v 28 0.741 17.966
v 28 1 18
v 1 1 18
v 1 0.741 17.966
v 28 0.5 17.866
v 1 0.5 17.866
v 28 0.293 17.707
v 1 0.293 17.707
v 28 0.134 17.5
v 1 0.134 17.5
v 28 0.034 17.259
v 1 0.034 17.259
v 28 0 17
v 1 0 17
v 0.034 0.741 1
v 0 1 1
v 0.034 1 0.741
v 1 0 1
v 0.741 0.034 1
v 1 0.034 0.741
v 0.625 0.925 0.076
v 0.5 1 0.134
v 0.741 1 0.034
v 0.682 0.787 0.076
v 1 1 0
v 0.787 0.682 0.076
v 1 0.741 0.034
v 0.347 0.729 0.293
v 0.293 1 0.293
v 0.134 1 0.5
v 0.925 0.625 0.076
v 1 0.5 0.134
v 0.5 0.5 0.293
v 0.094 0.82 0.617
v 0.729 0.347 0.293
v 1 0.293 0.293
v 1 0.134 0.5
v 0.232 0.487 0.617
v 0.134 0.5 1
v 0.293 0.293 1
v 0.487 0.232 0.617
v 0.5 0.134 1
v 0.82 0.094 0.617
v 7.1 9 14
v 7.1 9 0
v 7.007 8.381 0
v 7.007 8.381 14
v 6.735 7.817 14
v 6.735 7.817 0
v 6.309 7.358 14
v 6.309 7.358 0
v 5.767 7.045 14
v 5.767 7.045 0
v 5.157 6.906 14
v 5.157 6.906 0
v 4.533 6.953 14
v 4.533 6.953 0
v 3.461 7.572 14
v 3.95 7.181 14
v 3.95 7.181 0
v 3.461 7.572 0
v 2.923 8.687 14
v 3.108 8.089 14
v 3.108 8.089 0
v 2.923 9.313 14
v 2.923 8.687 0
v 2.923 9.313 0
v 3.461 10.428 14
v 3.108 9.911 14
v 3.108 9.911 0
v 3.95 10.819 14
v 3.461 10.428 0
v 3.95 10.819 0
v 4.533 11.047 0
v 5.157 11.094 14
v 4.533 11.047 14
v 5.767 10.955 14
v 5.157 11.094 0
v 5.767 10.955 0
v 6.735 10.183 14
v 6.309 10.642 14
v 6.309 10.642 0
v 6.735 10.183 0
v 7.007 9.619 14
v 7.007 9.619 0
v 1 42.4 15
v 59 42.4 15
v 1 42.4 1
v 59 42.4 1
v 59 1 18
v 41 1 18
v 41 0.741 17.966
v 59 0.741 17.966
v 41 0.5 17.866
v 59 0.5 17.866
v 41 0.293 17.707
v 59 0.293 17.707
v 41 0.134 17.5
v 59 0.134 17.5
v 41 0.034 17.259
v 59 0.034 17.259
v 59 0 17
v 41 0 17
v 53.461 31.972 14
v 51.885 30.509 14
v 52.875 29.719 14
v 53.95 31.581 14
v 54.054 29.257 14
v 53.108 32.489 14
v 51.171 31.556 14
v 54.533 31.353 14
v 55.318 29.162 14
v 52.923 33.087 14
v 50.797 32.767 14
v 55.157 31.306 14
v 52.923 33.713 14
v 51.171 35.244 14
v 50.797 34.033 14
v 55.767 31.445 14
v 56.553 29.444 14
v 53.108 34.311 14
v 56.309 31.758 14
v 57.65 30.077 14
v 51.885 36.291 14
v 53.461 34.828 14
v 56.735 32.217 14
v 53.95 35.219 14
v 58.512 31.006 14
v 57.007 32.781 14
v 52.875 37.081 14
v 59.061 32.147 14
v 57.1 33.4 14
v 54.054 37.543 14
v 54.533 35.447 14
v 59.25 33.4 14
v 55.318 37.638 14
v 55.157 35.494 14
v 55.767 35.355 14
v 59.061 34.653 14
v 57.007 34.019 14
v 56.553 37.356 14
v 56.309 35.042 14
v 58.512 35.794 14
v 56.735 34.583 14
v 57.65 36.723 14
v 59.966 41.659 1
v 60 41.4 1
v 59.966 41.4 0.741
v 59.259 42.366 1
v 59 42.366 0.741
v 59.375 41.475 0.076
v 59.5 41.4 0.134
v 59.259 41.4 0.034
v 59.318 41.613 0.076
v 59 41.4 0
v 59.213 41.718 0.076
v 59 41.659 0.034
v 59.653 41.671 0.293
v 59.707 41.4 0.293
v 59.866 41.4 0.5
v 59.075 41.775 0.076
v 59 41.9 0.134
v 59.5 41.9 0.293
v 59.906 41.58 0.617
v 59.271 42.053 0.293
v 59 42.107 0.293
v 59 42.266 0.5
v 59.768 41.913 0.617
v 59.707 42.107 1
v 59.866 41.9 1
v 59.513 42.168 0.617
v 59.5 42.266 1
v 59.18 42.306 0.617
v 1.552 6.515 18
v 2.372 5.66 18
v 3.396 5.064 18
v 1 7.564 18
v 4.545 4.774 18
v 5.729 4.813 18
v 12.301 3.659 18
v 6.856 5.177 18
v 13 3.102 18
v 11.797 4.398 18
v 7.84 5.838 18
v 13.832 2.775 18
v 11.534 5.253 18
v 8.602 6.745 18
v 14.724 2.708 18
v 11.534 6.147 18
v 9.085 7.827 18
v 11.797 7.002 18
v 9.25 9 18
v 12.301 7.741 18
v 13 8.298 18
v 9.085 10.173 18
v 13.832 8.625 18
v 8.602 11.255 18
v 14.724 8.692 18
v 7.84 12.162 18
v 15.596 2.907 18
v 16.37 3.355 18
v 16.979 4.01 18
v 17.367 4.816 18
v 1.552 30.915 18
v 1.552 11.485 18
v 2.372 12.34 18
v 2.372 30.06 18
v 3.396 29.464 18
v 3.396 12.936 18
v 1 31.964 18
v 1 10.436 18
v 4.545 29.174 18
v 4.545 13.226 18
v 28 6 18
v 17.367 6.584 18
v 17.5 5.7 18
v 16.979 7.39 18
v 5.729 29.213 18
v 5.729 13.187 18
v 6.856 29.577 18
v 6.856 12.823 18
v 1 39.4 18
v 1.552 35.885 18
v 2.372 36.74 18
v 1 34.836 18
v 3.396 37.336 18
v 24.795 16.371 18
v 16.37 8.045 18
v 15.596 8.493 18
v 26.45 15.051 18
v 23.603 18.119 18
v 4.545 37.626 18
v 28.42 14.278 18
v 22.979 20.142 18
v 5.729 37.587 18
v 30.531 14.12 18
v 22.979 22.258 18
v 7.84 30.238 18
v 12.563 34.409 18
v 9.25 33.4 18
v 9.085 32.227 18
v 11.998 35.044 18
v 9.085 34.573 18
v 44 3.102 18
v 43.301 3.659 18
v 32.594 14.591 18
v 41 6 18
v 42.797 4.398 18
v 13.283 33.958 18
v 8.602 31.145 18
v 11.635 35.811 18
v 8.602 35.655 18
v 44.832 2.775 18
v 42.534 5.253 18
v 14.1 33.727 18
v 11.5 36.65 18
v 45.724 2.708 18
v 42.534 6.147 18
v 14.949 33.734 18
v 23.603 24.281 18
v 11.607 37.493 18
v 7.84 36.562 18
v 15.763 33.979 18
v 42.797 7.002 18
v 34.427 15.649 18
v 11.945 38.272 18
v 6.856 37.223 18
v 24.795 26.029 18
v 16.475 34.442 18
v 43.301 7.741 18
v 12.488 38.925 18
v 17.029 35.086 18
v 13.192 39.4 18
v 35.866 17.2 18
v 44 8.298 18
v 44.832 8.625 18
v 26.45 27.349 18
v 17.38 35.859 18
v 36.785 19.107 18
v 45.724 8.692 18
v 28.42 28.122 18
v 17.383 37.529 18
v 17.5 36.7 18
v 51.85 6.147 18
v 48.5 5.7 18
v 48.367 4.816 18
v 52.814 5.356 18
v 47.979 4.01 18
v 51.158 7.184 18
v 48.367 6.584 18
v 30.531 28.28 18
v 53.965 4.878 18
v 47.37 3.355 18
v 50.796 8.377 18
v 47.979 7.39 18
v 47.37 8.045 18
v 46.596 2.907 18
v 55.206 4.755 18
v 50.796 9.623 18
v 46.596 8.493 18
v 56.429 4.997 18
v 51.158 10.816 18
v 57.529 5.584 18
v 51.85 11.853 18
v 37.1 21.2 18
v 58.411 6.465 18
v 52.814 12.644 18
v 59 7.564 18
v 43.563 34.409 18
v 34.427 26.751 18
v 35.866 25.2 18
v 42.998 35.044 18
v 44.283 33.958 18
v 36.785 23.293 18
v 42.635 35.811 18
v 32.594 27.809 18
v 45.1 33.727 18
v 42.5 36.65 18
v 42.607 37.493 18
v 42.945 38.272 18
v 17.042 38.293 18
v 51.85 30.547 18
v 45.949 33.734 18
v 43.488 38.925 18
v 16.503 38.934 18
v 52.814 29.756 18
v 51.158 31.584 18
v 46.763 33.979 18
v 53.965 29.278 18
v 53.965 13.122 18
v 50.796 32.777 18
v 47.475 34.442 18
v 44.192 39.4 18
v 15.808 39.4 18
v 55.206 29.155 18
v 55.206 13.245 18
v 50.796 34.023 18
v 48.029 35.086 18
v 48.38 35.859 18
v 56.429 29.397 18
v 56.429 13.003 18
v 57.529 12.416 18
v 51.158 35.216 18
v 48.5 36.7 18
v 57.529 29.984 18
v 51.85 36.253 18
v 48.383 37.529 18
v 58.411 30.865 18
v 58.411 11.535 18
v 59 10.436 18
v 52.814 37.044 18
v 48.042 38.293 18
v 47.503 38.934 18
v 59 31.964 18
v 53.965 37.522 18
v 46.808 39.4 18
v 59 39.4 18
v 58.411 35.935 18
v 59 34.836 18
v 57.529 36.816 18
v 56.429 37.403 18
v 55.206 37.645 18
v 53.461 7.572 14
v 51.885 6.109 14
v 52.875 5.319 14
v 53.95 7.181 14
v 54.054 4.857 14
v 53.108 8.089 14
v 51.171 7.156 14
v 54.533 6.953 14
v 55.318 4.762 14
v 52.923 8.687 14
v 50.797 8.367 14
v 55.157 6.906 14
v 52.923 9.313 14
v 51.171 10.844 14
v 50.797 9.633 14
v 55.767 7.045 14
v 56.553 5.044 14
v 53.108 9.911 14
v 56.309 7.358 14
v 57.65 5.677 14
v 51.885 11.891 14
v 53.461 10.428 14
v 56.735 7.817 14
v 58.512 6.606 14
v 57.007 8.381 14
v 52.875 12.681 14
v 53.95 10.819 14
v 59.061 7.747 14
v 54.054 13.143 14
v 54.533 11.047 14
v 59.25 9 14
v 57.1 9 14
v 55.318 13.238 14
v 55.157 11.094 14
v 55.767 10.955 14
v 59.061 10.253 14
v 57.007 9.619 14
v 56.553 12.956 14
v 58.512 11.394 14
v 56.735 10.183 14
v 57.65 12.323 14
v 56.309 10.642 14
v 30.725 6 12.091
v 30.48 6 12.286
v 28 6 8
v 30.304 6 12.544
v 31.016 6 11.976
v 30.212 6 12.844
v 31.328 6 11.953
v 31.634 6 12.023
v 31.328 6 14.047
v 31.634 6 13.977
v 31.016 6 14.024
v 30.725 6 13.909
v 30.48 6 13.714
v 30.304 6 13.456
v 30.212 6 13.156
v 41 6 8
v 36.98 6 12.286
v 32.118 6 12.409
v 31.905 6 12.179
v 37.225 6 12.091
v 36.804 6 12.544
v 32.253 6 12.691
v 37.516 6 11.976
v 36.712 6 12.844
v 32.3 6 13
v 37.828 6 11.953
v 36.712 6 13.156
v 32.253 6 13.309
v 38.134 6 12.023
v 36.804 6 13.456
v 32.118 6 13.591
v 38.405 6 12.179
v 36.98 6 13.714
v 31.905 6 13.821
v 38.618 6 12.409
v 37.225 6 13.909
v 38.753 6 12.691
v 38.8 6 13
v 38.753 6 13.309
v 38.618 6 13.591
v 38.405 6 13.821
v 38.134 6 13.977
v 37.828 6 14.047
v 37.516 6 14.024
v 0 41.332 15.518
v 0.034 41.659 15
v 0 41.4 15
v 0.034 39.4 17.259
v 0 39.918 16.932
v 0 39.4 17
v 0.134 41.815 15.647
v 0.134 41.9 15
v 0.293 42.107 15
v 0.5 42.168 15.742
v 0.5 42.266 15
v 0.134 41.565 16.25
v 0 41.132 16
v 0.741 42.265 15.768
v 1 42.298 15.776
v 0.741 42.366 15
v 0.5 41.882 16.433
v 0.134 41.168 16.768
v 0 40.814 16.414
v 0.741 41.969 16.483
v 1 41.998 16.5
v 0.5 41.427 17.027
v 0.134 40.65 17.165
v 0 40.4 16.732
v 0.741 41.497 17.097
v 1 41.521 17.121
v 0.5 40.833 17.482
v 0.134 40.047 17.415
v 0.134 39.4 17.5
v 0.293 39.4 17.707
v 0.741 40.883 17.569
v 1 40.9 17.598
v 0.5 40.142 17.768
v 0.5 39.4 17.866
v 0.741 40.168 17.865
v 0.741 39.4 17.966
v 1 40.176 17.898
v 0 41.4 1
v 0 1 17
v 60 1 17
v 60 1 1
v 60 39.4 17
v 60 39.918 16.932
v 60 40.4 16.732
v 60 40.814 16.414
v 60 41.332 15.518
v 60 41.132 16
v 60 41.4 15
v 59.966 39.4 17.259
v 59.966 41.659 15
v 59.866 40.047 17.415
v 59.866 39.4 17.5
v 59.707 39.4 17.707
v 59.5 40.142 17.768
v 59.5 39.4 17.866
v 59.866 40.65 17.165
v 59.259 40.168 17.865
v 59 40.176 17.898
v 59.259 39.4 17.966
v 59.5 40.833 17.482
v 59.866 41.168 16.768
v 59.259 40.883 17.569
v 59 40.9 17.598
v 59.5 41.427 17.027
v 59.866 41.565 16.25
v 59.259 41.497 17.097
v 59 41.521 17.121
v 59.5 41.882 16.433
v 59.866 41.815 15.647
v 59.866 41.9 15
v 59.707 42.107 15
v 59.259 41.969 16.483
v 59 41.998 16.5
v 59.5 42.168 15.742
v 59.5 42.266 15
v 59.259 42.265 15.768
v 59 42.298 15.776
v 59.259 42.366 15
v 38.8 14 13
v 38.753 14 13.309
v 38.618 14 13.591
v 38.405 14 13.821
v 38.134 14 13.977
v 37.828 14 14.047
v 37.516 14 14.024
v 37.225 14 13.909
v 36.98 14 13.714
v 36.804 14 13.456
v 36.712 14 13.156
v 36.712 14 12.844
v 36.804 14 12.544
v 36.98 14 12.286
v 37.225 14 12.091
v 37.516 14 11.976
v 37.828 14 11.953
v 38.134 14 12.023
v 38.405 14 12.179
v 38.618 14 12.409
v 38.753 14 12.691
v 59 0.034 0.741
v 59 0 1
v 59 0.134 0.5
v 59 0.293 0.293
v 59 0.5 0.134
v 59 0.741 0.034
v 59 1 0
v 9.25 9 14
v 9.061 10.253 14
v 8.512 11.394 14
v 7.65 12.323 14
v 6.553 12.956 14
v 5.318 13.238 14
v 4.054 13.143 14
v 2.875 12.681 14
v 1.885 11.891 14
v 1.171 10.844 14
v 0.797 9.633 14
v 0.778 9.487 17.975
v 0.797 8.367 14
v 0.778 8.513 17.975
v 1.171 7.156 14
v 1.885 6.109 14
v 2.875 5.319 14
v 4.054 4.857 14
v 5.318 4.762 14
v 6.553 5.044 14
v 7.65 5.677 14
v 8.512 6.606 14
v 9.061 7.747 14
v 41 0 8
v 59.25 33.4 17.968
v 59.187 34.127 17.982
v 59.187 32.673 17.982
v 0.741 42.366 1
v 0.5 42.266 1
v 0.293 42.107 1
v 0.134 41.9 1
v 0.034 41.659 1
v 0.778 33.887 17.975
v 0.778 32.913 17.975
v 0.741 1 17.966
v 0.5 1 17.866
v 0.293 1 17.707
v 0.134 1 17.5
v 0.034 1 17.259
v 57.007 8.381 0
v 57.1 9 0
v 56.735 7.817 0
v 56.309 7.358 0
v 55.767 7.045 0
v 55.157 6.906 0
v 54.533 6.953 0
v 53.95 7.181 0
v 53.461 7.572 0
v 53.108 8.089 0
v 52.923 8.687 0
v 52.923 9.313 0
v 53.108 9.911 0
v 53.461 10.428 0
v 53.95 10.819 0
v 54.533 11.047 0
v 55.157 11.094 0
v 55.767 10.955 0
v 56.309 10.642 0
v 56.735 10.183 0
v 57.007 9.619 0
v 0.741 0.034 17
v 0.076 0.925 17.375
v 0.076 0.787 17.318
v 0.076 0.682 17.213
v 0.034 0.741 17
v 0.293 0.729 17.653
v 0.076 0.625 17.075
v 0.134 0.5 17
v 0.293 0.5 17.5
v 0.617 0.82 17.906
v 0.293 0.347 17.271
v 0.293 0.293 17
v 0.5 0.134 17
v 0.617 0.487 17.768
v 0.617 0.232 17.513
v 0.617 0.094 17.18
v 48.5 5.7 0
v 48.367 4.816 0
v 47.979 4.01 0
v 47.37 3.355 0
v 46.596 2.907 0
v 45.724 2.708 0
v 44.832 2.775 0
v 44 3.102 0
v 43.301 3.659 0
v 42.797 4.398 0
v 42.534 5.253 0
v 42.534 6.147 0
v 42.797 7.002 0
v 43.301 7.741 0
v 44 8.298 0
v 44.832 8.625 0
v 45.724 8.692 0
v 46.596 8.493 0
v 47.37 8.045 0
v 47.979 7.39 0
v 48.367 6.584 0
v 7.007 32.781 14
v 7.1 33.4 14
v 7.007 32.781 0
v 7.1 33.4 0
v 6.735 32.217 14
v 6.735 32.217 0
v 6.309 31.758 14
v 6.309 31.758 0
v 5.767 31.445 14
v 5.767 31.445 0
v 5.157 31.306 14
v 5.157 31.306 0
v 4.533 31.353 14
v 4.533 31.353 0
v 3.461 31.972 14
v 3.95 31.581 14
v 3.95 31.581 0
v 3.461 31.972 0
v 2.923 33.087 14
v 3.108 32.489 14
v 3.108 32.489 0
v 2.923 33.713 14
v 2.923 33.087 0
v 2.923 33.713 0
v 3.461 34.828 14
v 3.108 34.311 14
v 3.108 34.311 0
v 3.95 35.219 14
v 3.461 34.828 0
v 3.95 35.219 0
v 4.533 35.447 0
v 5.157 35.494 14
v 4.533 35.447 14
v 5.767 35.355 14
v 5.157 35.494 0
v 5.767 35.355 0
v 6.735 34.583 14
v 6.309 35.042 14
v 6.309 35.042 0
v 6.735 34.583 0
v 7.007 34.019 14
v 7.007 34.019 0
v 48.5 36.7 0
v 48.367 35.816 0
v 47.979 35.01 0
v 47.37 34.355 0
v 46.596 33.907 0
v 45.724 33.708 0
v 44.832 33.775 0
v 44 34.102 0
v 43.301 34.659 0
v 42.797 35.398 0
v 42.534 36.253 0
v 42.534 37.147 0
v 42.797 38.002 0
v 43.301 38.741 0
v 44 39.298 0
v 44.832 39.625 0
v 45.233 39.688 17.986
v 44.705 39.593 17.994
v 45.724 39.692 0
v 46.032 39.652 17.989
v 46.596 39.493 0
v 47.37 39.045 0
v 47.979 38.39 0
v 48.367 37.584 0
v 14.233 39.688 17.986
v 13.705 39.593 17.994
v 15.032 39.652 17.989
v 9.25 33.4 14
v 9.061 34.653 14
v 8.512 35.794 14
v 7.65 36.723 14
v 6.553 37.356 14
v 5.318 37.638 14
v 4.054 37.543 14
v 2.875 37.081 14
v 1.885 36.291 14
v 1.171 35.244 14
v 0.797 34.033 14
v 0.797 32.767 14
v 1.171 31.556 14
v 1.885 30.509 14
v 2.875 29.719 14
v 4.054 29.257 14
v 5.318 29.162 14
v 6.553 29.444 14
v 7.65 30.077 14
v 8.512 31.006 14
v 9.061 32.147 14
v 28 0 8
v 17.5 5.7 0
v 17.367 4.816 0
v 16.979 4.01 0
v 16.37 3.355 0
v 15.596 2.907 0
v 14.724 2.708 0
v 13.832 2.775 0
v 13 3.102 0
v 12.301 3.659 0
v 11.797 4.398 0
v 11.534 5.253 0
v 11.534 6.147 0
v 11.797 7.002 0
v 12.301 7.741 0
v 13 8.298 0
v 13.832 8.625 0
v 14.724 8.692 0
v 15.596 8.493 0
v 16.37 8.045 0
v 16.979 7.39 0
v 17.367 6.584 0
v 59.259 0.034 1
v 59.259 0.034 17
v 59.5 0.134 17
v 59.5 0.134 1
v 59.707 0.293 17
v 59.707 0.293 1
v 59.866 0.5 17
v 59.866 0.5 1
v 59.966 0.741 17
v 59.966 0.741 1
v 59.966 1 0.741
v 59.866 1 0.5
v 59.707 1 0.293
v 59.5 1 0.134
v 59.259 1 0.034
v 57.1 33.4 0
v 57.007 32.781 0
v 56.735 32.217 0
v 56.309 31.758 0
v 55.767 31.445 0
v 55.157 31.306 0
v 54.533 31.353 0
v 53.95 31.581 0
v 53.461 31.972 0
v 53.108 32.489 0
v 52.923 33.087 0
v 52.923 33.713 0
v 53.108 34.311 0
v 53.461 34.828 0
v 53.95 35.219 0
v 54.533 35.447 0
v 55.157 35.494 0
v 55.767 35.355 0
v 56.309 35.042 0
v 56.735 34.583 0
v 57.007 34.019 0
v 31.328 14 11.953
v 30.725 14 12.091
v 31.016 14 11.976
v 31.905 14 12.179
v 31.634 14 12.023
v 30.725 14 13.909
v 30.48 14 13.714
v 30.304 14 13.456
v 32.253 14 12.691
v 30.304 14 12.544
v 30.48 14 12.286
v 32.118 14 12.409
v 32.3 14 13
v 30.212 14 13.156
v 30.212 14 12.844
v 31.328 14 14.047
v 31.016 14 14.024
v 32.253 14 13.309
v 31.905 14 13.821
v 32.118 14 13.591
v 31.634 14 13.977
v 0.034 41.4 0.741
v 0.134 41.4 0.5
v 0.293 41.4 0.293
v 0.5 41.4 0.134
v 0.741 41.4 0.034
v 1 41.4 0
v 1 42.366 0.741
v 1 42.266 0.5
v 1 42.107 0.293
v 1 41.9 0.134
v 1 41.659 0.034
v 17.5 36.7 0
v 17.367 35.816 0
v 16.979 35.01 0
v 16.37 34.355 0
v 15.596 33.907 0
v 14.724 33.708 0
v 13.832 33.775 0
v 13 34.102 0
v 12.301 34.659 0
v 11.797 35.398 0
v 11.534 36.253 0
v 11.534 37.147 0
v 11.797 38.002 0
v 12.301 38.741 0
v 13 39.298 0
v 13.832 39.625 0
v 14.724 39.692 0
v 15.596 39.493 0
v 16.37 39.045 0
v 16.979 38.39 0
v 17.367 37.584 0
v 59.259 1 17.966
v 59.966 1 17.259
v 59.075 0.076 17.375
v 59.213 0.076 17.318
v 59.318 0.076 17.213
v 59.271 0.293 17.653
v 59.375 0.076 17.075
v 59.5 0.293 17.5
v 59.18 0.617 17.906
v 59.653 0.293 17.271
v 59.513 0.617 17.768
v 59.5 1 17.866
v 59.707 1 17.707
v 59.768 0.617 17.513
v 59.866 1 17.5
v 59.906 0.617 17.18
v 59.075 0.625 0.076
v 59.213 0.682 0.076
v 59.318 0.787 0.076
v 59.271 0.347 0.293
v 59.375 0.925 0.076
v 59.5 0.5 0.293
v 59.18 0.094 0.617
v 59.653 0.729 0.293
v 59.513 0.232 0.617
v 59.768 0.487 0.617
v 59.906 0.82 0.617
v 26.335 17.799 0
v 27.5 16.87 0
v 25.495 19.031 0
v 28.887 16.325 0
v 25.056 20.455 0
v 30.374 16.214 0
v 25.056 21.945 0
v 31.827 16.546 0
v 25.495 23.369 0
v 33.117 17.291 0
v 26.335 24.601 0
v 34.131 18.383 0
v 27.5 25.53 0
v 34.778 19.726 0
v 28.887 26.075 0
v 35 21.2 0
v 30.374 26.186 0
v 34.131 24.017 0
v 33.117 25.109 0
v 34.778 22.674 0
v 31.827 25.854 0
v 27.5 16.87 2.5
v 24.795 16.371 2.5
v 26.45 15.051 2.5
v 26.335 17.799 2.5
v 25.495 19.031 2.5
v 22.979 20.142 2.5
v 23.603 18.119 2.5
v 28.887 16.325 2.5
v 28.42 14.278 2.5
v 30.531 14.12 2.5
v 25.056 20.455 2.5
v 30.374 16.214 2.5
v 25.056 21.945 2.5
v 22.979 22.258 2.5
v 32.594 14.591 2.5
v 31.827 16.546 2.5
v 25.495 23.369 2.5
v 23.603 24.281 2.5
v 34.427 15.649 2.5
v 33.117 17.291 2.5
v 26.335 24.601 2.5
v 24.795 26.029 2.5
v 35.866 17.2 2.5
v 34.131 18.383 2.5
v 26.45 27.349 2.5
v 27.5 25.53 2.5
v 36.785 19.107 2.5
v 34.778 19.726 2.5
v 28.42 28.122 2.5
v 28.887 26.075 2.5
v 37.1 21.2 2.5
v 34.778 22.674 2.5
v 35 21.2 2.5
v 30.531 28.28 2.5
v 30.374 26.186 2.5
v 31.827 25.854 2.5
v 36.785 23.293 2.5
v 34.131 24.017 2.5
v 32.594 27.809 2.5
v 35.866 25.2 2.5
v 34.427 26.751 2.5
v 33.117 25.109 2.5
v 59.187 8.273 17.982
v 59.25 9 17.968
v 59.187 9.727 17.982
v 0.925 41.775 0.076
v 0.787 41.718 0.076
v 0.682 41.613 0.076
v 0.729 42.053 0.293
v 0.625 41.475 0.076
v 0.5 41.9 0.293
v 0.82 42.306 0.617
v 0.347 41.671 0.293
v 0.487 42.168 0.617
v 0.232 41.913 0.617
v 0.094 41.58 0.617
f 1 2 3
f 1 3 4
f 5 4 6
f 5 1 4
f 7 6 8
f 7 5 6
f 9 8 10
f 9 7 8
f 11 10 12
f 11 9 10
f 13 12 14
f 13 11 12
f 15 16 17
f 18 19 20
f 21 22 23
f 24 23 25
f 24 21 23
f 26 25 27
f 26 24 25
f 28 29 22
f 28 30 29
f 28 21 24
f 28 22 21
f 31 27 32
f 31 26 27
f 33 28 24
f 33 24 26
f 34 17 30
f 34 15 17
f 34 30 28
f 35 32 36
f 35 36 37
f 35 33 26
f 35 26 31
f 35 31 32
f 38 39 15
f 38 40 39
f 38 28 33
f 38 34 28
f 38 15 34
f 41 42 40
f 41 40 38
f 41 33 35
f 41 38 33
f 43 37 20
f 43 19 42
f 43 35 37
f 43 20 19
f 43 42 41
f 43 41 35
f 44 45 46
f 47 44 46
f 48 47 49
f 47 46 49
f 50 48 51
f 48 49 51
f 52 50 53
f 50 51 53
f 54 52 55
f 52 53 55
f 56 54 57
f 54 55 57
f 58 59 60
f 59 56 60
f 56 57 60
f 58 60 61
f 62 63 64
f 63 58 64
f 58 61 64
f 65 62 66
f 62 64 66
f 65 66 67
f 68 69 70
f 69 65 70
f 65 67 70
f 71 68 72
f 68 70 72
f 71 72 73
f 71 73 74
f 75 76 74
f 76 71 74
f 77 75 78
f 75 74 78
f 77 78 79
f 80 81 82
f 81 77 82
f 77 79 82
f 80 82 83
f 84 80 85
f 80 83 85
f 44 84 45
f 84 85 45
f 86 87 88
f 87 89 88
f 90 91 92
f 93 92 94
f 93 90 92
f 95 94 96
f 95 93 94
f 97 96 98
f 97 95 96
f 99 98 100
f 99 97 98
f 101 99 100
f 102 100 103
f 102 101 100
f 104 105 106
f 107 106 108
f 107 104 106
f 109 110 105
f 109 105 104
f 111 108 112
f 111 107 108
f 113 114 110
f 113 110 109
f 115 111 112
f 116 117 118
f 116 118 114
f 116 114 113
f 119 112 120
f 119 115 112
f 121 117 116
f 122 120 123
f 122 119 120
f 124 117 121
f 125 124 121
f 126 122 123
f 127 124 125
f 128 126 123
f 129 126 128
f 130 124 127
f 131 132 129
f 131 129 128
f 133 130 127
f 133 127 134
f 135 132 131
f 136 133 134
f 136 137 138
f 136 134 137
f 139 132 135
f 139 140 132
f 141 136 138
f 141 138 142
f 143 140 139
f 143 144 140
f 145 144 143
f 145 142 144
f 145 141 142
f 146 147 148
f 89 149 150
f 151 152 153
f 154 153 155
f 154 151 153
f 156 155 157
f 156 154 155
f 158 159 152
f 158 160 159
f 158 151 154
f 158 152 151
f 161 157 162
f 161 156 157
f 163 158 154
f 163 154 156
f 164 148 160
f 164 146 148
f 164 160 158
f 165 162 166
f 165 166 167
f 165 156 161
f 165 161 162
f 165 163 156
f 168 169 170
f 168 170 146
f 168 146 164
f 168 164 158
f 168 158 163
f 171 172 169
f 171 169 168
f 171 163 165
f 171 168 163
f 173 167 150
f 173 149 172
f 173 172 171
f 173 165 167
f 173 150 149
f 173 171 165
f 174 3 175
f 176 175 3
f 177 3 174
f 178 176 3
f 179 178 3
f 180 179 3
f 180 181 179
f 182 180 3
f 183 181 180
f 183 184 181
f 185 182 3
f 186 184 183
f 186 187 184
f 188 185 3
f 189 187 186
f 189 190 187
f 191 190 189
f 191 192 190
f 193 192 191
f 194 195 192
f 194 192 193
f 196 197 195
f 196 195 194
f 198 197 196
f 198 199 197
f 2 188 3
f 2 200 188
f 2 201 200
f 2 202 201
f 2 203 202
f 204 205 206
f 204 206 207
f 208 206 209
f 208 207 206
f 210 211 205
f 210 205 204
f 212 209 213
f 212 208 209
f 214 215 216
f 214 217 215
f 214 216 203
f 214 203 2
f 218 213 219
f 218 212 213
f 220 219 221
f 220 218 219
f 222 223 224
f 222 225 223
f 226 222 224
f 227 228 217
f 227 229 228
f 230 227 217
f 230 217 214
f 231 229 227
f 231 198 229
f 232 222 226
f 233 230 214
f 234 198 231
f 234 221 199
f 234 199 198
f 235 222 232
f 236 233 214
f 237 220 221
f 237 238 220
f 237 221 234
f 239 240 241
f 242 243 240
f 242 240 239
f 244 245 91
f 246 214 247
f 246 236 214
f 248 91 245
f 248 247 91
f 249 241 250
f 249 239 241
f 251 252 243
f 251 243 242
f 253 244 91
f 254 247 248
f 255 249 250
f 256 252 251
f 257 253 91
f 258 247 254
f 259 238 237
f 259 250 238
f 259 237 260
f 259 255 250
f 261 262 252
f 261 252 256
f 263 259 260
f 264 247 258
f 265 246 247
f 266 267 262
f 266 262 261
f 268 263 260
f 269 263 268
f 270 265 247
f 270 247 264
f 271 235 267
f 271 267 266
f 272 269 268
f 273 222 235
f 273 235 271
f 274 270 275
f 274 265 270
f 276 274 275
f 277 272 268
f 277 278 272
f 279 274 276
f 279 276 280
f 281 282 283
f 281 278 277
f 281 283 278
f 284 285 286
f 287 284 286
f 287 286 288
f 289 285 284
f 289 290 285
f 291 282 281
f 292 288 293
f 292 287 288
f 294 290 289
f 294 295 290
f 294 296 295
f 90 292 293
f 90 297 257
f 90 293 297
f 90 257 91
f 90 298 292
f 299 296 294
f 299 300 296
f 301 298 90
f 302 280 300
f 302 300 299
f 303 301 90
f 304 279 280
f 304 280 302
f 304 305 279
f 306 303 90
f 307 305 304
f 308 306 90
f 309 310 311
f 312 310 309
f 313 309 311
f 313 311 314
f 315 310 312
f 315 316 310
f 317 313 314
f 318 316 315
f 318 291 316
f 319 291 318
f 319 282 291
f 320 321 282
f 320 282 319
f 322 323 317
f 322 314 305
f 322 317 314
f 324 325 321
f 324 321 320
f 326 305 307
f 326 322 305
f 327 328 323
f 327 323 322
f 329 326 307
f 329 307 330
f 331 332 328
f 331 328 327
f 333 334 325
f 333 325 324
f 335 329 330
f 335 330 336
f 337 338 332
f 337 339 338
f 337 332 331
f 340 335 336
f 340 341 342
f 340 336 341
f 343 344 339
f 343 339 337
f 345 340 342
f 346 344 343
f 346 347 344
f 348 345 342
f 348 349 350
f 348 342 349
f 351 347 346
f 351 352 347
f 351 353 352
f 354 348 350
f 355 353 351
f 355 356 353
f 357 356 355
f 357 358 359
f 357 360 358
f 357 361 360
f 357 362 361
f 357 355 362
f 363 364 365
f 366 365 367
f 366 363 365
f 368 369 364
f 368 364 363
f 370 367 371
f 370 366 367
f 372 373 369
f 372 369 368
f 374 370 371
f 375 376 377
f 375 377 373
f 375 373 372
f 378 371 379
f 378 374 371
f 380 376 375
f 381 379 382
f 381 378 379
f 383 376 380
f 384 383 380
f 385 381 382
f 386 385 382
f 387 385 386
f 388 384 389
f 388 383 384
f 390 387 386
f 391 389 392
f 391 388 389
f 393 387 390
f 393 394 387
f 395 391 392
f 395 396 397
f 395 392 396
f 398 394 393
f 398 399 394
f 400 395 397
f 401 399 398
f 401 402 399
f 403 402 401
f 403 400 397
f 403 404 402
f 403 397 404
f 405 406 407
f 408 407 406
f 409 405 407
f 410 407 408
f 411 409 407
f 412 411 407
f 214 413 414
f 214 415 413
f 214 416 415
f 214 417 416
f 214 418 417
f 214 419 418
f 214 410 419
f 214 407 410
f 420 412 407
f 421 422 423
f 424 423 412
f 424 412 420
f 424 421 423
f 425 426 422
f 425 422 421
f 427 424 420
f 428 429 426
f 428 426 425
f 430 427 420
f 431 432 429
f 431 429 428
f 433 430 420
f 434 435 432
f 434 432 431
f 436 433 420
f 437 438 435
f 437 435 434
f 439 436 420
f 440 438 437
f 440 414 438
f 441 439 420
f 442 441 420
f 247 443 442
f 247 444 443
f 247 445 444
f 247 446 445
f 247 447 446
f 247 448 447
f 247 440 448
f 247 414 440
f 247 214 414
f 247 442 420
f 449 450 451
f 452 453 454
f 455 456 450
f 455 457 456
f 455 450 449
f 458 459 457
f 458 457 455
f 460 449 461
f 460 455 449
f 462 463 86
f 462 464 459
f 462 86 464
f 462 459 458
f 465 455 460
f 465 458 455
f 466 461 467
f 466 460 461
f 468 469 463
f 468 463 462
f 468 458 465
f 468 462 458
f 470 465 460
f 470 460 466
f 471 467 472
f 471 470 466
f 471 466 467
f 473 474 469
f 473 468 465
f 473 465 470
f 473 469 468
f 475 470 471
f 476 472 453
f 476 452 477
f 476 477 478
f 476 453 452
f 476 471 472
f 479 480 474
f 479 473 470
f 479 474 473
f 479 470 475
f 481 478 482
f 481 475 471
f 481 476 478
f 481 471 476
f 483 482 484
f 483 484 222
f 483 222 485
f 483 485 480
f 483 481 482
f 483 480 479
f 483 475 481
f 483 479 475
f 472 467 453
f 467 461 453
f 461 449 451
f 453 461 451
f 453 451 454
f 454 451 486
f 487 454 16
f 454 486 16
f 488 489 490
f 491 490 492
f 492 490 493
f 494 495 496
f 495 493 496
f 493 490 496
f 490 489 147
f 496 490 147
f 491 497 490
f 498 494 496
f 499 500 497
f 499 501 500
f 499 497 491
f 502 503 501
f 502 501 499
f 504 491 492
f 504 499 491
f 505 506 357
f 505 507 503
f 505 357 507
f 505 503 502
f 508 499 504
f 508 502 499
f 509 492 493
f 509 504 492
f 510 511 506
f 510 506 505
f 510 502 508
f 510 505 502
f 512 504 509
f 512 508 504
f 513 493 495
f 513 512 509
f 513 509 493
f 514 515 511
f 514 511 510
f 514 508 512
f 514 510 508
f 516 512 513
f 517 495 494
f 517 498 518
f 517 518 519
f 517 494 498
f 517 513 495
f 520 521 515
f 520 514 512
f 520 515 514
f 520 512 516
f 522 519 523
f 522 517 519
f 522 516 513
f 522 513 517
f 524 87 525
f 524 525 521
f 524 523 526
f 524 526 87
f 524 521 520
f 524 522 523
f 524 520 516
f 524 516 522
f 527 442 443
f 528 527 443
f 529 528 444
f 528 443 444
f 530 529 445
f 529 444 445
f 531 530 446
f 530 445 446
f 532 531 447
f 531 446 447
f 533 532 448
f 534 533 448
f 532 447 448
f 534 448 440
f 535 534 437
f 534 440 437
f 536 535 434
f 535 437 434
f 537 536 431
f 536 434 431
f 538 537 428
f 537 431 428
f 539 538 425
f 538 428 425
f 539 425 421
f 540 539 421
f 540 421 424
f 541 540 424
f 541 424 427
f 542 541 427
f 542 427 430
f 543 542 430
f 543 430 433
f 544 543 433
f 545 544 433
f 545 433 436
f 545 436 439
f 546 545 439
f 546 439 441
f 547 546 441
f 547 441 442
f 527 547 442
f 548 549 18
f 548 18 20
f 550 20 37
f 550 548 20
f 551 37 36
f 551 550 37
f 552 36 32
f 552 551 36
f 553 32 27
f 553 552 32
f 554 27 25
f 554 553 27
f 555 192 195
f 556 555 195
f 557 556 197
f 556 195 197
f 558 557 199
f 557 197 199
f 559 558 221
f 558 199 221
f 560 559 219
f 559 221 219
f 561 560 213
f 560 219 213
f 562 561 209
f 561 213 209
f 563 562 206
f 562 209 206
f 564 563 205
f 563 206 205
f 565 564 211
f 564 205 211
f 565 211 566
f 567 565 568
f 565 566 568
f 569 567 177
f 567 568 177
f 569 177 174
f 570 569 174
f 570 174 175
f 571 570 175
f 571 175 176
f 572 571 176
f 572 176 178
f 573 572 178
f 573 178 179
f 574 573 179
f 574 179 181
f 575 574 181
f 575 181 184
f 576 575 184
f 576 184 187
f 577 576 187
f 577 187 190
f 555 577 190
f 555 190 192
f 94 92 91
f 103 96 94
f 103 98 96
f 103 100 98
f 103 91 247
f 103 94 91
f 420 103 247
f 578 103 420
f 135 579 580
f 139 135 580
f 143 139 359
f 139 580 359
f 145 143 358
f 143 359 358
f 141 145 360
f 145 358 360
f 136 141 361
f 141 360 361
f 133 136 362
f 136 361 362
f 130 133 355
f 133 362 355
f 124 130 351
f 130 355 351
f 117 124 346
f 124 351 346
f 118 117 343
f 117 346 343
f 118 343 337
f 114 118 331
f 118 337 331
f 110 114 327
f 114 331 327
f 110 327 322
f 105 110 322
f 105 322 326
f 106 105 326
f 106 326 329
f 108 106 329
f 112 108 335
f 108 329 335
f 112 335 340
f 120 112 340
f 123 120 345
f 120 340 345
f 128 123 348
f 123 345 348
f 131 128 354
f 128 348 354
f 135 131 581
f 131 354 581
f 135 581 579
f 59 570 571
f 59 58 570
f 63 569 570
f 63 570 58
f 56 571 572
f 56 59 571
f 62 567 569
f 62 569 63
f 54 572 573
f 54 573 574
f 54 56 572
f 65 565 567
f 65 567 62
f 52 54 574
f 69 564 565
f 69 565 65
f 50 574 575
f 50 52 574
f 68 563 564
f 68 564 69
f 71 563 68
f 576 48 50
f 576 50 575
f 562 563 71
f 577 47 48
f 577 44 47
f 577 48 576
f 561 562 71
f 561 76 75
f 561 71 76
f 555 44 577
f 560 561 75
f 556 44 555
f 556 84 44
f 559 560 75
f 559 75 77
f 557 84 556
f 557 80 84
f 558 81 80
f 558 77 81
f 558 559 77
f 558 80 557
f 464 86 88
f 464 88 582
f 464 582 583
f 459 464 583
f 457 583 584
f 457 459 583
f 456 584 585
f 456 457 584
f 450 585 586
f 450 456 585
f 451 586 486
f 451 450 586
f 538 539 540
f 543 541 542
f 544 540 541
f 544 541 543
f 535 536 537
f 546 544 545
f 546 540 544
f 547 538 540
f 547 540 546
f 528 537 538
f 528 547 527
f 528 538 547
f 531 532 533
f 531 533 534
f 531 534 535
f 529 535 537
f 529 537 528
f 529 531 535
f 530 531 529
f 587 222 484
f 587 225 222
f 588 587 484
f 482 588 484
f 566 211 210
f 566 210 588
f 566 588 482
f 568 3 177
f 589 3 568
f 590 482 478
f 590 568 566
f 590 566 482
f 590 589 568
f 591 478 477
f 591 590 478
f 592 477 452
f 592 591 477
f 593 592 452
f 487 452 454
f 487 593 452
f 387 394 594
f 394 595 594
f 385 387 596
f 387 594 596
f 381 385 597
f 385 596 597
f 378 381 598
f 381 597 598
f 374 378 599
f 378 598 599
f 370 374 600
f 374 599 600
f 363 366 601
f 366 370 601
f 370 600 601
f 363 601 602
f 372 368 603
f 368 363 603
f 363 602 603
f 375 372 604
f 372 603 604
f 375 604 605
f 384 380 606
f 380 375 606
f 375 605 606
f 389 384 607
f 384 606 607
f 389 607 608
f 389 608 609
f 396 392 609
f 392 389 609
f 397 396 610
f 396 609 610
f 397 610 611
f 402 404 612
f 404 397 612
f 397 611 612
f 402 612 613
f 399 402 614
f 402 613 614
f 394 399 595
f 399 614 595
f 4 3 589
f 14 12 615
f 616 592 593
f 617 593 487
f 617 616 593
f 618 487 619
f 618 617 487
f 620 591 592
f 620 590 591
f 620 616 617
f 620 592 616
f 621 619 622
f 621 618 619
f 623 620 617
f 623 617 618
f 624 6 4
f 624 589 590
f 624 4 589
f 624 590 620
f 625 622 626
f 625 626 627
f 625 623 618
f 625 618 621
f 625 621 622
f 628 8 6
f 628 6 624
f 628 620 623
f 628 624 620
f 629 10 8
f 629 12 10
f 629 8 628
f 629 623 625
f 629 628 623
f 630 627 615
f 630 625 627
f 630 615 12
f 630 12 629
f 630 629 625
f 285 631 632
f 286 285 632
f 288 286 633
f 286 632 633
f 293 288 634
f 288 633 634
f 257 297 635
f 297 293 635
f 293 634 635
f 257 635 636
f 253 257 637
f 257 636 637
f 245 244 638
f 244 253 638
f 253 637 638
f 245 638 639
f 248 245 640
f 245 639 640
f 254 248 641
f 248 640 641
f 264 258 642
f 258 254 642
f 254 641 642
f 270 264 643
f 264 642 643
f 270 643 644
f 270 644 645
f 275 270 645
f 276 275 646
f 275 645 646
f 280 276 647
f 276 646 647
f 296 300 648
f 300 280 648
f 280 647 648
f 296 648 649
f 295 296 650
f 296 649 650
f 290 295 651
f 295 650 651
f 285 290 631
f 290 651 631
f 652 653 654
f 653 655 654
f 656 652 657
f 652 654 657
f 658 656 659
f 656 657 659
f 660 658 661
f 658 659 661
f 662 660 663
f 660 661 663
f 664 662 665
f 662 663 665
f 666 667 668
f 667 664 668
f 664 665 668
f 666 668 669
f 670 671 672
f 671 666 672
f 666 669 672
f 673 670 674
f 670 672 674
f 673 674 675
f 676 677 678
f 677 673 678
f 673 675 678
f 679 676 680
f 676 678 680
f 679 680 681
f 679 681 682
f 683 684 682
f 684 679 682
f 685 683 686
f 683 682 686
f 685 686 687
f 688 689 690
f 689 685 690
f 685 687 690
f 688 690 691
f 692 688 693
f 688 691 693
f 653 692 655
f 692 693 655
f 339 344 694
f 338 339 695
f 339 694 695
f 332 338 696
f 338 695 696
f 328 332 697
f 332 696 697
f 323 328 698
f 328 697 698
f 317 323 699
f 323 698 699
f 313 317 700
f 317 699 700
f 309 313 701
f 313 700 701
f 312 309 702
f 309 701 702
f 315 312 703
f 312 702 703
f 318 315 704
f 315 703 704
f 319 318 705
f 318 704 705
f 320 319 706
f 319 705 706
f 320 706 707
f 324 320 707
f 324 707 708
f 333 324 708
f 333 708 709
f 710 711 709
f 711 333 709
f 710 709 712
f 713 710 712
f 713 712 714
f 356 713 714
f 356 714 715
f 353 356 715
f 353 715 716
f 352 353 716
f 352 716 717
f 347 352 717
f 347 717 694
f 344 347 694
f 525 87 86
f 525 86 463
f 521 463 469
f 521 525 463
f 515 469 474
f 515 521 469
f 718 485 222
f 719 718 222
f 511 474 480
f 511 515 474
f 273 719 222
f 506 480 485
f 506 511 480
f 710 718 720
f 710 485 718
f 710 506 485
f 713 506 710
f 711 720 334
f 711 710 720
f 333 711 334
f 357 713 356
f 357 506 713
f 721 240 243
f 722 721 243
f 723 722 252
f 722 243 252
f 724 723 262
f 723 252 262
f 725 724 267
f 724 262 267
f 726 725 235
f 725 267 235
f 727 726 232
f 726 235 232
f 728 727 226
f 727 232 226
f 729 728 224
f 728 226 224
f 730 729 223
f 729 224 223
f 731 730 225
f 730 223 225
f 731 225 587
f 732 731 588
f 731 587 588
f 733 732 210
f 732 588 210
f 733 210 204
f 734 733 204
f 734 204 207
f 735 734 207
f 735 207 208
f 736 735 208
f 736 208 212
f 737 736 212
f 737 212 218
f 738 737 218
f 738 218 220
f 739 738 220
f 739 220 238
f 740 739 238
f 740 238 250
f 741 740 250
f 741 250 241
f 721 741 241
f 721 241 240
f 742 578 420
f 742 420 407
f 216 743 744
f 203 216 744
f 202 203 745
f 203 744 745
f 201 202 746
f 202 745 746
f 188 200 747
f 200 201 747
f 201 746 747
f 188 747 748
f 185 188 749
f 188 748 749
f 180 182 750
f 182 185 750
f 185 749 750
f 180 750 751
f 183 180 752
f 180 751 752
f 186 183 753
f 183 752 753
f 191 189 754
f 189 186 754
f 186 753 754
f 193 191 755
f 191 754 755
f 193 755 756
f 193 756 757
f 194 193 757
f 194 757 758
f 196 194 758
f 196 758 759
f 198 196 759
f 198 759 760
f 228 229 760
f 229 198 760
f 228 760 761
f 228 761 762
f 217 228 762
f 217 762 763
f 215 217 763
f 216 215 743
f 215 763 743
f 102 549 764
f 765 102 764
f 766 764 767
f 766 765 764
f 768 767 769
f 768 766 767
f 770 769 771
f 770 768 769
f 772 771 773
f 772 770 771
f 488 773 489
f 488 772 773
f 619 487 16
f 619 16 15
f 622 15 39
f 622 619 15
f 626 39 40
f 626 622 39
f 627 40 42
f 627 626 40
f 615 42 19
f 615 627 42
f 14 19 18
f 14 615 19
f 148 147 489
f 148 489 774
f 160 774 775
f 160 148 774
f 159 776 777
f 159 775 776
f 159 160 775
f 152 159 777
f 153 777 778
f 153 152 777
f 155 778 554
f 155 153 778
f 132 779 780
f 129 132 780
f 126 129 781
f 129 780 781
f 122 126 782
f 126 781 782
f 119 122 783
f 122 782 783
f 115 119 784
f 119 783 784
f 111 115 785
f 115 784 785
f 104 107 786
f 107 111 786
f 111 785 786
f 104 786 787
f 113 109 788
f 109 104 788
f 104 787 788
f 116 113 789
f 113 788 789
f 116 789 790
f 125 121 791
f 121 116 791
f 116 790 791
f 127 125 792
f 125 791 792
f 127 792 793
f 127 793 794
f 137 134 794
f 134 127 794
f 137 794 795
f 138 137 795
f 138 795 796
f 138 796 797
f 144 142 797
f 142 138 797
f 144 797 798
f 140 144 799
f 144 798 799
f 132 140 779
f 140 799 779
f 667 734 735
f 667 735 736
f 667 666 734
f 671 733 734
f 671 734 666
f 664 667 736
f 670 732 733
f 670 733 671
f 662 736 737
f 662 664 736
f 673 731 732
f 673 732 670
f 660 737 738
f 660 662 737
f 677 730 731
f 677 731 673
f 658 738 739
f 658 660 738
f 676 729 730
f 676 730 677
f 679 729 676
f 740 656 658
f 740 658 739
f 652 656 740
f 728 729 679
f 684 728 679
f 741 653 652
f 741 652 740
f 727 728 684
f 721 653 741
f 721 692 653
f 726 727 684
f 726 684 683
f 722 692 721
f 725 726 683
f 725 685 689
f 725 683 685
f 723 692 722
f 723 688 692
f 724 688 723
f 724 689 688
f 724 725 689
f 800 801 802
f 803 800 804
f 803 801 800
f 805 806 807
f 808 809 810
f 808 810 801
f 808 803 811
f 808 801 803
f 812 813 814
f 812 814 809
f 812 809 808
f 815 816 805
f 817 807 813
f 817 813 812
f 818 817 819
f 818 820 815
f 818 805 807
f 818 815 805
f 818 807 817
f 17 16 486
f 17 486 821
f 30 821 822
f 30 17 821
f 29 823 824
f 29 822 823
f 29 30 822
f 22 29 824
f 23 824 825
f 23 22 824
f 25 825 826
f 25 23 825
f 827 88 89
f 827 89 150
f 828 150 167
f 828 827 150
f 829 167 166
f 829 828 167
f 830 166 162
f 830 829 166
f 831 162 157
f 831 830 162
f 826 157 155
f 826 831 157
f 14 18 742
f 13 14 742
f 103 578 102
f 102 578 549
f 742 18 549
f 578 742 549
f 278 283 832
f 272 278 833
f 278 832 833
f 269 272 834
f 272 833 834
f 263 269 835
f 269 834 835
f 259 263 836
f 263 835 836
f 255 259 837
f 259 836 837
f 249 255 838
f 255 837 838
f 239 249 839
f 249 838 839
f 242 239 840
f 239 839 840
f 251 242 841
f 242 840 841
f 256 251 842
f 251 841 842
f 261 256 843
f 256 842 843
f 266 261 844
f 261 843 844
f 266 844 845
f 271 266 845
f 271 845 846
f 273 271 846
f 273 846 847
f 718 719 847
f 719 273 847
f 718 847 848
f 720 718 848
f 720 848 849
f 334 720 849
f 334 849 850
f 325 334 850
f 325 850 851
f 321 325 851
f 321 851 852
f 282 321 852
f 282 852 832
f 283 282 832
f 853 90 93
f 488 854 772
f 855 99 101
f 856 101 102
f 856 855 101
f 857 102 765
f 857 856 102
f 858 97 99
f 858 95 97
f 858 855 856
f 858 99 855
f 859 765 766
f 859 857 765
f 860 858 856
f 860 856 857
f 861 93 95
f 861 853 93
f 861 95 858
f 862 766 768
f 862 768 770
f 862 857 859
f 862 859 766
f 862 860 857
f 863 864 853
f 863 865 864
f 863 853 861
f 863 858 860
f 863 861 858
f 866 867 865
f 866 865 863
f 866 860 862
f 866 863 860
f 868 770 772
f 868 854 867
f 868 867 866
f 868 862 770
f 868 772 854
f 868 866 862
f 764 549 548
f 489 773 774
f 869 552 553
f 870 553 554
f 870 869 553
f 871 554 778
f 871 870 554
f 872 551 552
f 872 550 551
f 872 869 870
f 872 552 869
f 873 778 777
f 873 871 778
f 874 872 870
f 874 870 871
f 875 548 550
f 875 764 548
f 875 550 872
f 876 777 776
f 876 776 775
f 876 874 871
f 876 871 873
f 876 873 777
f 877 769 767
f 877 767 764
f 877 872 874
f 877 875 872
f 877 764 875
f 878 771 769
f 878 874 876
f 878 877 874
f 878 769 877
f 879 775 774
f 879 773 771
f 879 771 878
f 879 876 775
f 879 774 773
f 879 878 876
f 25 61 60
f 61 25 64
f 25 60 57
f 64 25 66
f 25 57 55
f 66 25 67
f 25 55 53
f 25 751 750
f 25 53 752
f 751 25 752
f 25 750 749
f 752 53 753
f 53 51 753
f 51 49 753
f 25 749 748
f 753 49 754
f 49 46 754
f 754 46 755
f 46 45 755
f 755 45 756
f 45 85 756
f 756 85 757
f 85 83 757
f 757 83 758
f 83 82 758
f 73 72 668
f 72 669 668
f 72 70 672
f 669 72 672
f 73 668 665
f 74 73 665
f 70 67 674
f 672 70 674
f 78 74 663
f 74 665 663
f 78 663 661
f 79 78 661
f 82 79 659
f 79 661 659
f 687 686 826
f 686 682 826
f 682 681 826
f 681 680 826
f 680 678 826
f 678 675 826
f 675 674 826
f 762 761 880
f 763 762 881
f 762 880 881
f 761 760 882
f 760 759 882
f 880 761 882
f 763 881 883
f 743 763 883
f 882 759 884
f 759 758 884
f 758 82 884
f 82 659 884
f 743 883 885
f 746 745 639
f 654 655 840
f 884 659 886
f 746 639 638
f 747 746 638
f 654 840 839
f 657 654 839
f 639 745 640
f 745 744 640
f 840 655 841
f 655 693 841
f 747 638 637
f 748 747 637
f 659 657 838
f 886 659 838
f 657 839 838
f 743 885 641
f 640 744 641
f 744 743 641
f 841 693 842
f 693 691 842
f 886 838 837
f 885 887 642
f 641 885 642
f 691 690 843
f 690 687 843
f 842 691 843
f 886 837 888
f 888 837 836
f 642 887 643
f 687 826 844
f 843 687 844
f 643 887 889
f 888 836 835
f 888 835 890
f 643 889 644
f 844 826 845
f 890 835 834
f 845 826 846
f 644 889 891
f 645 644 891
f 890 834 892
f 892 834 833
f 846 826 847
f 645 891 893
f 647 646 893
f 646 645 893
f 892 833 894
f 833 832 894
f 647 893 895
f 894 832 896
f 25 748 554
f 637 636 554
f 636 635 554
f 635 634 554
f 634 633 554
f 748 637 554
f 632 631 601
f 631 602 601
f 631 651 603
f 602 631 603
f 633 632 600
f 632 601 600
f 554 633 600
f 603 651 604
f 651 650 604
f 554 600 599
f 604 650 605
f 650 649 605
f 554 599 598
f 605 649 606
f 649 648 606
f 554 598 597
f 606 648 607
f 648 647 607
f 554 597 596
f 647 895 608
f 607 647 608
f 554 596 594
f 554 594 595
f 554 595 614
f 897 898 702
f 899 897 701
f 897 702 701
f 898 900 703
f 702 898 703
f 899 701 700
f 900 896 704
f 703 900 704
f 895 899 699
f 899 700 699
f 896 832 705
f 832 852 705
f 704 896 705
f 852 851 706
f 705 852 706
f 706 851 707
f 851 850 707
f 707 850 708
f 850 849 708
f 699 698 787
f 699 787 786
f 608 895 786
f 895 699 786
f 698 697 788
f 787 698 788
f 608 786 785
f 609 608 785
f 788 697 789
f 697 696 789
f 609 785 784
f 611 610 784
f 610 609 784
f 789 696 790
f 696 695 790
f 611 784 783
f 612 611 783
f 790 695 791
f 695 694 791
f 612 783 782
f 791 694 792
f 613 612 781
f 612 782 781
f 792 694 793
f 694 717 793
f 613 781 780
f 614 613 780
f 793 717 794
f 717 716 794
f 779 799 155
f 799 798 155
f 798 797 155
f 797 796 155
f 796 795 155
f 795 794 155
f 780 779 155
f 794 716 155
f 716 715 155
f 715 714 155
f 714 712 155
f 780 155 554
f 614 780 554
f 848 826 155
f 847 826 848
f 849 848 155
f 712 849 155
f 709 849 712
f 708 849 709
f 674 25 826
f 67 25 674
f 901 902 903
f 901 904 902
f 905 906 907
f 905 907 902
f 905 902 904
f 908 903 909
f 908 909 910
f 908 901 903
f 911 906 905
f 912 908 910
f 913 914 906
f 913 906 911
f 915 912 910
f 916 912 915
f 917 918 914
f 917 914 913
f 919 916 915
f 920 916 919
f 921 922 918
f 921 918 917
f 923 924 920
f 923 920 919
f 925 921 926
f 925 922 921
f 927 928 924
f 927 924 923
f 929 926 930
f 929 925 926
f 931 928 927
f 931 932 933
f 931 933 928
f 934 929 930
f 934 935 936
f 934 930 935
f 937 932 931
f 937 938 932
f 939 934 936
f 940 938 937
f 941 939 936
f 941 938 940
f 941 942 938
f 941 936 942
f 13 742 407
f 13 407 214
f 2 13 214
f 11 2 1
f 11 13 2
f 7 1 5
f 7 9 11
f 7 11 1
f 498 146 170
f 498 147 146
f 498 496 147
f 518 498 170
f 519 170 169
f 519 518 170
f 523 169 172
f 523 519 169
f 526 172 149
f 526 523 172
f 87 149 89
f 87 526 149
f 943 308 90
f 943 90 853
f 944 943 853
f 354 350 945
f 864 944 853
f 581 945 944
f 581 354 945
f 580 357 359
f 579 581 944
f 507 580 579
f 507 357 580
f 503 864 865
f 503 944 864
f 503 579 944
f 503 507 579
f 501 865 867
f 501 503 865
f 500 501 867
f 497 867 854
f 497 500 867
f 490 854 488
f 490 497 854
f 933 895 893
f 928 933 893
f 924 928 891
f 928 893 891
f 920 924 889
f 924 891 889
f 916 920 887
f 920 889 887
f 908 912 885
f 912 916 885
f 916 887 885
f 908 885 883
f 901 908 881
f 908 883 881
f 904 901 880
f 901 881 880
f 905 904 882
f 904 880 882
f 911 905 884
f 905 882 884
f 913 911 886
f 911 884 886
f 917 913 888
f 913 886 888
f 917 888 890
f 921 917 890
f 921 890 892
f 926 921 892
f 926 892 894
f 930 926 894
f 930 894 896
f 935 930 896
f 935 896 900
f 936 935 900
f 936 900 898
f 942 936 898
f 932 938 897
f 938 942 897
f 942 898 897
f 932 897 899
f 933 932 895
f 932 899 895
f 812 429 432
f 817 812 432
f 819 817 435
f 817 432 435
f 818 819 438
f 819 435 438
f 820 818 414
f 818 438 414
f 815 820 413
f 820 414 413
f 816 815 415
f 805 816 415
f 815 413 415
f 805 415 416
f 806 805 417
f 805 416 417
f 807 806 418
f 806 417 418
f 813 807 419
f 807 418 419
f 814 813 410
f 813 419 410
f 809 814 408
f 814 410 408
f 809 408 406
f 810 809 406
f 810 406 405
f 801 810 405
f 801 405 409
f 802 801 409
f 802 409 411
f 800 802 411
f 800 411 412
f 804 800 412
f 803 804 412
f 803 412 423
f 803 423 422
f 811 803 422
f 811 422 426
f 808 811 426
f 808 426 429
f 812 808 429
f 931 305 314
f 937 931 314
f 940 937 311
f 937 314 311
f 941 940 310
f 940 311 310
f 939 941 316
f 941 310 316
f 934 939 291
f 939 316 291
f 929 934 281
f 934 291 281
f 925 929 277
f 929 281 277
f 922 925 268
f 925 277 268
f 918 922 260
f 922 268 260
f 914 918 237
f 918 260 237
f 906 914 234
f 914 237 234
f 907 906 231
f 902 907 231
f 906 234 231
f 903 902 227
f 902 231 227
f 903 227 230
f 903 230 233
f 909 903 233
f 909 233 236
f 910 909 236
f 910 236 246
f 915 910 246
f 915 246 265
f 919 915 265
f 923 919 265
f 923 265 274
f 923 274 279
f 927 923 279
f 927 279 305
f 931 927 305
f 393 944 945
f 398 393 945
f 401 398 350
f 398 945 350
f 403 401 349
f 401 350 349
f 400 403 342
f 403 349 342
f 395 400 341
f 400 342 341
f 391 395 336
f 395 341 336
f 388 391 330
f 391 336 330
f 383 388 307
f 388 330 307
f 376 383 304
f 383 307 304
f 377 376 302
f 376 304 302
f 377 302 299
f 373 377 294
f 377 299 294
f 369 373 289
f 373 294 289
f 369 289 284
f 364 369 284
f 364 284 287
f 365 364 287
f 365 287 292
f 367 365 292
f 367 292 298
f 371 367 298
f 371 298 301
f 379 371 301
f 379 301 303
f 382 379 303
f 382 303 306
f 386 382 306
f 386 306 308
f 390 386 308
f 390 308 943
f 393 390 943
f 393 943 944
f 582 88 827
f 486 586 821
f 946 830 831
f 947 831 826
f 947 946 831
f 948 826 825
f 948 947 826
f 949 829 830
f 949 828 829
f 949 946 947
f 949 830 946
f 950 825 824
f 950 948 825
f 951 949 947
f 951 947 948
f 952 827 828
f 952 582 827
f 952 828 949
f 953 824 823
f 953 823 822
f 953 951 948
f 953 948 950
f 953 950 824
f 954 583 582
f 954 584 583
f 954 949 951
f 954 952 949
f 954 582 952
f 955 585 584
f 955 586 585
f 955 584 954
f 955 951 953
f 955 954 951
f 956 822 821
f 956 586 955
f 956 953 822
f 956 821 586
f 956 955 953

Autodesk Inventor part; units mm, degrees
ref_plane "YZ Plane" through (0, 0, 0) normal (1, 0, 0) x (0, 1, 0)
ref_plane "XZ Plane" through (0, 0, 0) normal (0, 1, 0) x (-1, 0, 0)
ref_plane "XY Plane" through (0, 0, 0) normal (0, 0, 1) x (1, 0, 0)
sketch "Sketch1" plane through (0, 0, 0) normal (0, 0, 1) x (1, 0, 0)
  line L0 (0, 0) -> (60, 0)
  line L1 (60, 0) -> (60, 42.4)
  line L2 (60, 42.4) -> (0, 42.4)
  line L3 (0, 42.4) -> (0, 0)
  circle A0 centre (5, 33.4) radius 2.1
  circle A1 centre (55, 33.4) radius 2.1
  circle A2 centre (55, 9) radius 2.1
  circle A3 centre (5, 9) radius 2.1
  circle A4 centre (30, 21.2) radius 5
  circle A5 centre (14.5, 36.7) radius 3
  circle A6 centre (45.5, 36.7) radius 3
  circle A7 centre (45.5, 5.7) radius 3
  circle A8 centre (14.5, 5.7) radius 3
  dimension "d0" = 42.4
  dimension "d1" = 60
  dimension "d2" = 10
  dimension "d3" = 4.2
  dimension "d4" = 24.4
  dimension "d5" = 50
  dimension "d6" = 9
  dimension "d7" = 5
  dimension "d8" = 6
  dimension "d9" = 31
  dimension "d10" = 31
  dimension "d11" = 5.7
  dimension "d12" = 14.5
  dimension "d13" = 30
  dimension "d14" = 21.2
extrude "Extrusion1" add sketch "Sketch1" along normal blind 18
fillet "Fillet1" radius 1 11 edges at (0, 42.4, 9) (60, 42.4, 9) (30, 42.4, 0) (60, 21.2, 18) (30, 0, 18) (0, 21.2, 18) (0, 0, 9) (0, 21.2, 0) (60, 0, 9) (60, 21.2, 0) (30, 0, 0)
fillet "Fillet2" radius 3 3 edges at (30, 42.4, 18) (59.7071, 42.1071, 17.7071) (0.2929, 42.1071, 17.7071)
sketch "Sketch2" plane through (0, 0, 18) normal (0, 0, 1) x (1, 0, 0)
  circle A0 centre (5, 33.4) radius 2.1 projected
  circle A1 centre (55, 33.4) radius 2.1 projected
  circle A2 centre (55, 9) radius 2.1 projected
  circle A3 centre (5, 9) radius 2.1 projected
  circle A4 centre (5, 33.4) radius 4.25
  circle A5 centre (55, 33.4) radius 4.25
  circle A6 centre (55, 9) radius 4.25
  circle A7 centre (5, 9) radius 4.25
  point P0 (0, 0)
  dimension "d19" = 8.5
extrude "Extrusion2" cut sketch "Sketch2" against normal blind 4
sketch "Sketch3" plane through (1, 0, 1) normal (0, -1, 0) x (1, 0, 0)
  line L0 (27, 17) -> (40, 17)
  line L1 (40, 17) -> (40, 7)
  line L2 (40, 7) -> (27, 7)
  line L3 (27, 7) -> (27, 17)
  line L4 (58, 17) -> (0, 17) projected
  line L5 (59, 0) -> (59, 16) projected
  point P0 (-1, -1)
  dimension "d22" = 19
  dimension "d23" = 13
  dimension "d24" = 10
extrude "Extrusion3" cut sketch "Sketch3" against normal blind 6
sketch "Sketch4" plane through (1, 0, 1) normal (0, -1, 0) x (1, 0, 0)
  line L0 (27, 7) -> (27, 16) projected
  circle A0 centre (30.25, 12) radius 1.05
  circle A1 centre (36.75, 12) radius 1.05
  line L1 (27, 17) -> (0, 17) projected
  point P0 (-1, -1)
  dimension "d27" = 2.1
  dimension "d28" = 5
  dimension "d29" = 6.5
  dimension "d30" = 3.25
extrude "Extrusion4" cut sketch "Sketch4" against normal blind 14
sketch "Sketch5" plane through (0, 0, 18) normal (0, 0, 1) x (1, 0, 0)
  circle A0 centre (30, 21.2) radius 5 projected
  circle A1 centre (30, 21.2) radius 7.1
  point P0 (0, 0)
  dimension "d33" = 14.2
extrude "Extrusion5" cut sketch "Sketch5" against normal blind 15.5
equation "\"d6\" = -0.5 * d4 + 0.5 * d0"
equation "\"d7\" = -0.5 * d5 + 0.5 * d1"
equation "\"d11\" = -0.5 * d10 + 0.5 * d0"
equation "\"d12\" = -0.5 * d9 + 0.5 * d1"
equation "\"d13\" = 0.5 * d1"
equation "\"d14\" = 0.5 * d0"
properties part number "V5 Z Top bearing"
